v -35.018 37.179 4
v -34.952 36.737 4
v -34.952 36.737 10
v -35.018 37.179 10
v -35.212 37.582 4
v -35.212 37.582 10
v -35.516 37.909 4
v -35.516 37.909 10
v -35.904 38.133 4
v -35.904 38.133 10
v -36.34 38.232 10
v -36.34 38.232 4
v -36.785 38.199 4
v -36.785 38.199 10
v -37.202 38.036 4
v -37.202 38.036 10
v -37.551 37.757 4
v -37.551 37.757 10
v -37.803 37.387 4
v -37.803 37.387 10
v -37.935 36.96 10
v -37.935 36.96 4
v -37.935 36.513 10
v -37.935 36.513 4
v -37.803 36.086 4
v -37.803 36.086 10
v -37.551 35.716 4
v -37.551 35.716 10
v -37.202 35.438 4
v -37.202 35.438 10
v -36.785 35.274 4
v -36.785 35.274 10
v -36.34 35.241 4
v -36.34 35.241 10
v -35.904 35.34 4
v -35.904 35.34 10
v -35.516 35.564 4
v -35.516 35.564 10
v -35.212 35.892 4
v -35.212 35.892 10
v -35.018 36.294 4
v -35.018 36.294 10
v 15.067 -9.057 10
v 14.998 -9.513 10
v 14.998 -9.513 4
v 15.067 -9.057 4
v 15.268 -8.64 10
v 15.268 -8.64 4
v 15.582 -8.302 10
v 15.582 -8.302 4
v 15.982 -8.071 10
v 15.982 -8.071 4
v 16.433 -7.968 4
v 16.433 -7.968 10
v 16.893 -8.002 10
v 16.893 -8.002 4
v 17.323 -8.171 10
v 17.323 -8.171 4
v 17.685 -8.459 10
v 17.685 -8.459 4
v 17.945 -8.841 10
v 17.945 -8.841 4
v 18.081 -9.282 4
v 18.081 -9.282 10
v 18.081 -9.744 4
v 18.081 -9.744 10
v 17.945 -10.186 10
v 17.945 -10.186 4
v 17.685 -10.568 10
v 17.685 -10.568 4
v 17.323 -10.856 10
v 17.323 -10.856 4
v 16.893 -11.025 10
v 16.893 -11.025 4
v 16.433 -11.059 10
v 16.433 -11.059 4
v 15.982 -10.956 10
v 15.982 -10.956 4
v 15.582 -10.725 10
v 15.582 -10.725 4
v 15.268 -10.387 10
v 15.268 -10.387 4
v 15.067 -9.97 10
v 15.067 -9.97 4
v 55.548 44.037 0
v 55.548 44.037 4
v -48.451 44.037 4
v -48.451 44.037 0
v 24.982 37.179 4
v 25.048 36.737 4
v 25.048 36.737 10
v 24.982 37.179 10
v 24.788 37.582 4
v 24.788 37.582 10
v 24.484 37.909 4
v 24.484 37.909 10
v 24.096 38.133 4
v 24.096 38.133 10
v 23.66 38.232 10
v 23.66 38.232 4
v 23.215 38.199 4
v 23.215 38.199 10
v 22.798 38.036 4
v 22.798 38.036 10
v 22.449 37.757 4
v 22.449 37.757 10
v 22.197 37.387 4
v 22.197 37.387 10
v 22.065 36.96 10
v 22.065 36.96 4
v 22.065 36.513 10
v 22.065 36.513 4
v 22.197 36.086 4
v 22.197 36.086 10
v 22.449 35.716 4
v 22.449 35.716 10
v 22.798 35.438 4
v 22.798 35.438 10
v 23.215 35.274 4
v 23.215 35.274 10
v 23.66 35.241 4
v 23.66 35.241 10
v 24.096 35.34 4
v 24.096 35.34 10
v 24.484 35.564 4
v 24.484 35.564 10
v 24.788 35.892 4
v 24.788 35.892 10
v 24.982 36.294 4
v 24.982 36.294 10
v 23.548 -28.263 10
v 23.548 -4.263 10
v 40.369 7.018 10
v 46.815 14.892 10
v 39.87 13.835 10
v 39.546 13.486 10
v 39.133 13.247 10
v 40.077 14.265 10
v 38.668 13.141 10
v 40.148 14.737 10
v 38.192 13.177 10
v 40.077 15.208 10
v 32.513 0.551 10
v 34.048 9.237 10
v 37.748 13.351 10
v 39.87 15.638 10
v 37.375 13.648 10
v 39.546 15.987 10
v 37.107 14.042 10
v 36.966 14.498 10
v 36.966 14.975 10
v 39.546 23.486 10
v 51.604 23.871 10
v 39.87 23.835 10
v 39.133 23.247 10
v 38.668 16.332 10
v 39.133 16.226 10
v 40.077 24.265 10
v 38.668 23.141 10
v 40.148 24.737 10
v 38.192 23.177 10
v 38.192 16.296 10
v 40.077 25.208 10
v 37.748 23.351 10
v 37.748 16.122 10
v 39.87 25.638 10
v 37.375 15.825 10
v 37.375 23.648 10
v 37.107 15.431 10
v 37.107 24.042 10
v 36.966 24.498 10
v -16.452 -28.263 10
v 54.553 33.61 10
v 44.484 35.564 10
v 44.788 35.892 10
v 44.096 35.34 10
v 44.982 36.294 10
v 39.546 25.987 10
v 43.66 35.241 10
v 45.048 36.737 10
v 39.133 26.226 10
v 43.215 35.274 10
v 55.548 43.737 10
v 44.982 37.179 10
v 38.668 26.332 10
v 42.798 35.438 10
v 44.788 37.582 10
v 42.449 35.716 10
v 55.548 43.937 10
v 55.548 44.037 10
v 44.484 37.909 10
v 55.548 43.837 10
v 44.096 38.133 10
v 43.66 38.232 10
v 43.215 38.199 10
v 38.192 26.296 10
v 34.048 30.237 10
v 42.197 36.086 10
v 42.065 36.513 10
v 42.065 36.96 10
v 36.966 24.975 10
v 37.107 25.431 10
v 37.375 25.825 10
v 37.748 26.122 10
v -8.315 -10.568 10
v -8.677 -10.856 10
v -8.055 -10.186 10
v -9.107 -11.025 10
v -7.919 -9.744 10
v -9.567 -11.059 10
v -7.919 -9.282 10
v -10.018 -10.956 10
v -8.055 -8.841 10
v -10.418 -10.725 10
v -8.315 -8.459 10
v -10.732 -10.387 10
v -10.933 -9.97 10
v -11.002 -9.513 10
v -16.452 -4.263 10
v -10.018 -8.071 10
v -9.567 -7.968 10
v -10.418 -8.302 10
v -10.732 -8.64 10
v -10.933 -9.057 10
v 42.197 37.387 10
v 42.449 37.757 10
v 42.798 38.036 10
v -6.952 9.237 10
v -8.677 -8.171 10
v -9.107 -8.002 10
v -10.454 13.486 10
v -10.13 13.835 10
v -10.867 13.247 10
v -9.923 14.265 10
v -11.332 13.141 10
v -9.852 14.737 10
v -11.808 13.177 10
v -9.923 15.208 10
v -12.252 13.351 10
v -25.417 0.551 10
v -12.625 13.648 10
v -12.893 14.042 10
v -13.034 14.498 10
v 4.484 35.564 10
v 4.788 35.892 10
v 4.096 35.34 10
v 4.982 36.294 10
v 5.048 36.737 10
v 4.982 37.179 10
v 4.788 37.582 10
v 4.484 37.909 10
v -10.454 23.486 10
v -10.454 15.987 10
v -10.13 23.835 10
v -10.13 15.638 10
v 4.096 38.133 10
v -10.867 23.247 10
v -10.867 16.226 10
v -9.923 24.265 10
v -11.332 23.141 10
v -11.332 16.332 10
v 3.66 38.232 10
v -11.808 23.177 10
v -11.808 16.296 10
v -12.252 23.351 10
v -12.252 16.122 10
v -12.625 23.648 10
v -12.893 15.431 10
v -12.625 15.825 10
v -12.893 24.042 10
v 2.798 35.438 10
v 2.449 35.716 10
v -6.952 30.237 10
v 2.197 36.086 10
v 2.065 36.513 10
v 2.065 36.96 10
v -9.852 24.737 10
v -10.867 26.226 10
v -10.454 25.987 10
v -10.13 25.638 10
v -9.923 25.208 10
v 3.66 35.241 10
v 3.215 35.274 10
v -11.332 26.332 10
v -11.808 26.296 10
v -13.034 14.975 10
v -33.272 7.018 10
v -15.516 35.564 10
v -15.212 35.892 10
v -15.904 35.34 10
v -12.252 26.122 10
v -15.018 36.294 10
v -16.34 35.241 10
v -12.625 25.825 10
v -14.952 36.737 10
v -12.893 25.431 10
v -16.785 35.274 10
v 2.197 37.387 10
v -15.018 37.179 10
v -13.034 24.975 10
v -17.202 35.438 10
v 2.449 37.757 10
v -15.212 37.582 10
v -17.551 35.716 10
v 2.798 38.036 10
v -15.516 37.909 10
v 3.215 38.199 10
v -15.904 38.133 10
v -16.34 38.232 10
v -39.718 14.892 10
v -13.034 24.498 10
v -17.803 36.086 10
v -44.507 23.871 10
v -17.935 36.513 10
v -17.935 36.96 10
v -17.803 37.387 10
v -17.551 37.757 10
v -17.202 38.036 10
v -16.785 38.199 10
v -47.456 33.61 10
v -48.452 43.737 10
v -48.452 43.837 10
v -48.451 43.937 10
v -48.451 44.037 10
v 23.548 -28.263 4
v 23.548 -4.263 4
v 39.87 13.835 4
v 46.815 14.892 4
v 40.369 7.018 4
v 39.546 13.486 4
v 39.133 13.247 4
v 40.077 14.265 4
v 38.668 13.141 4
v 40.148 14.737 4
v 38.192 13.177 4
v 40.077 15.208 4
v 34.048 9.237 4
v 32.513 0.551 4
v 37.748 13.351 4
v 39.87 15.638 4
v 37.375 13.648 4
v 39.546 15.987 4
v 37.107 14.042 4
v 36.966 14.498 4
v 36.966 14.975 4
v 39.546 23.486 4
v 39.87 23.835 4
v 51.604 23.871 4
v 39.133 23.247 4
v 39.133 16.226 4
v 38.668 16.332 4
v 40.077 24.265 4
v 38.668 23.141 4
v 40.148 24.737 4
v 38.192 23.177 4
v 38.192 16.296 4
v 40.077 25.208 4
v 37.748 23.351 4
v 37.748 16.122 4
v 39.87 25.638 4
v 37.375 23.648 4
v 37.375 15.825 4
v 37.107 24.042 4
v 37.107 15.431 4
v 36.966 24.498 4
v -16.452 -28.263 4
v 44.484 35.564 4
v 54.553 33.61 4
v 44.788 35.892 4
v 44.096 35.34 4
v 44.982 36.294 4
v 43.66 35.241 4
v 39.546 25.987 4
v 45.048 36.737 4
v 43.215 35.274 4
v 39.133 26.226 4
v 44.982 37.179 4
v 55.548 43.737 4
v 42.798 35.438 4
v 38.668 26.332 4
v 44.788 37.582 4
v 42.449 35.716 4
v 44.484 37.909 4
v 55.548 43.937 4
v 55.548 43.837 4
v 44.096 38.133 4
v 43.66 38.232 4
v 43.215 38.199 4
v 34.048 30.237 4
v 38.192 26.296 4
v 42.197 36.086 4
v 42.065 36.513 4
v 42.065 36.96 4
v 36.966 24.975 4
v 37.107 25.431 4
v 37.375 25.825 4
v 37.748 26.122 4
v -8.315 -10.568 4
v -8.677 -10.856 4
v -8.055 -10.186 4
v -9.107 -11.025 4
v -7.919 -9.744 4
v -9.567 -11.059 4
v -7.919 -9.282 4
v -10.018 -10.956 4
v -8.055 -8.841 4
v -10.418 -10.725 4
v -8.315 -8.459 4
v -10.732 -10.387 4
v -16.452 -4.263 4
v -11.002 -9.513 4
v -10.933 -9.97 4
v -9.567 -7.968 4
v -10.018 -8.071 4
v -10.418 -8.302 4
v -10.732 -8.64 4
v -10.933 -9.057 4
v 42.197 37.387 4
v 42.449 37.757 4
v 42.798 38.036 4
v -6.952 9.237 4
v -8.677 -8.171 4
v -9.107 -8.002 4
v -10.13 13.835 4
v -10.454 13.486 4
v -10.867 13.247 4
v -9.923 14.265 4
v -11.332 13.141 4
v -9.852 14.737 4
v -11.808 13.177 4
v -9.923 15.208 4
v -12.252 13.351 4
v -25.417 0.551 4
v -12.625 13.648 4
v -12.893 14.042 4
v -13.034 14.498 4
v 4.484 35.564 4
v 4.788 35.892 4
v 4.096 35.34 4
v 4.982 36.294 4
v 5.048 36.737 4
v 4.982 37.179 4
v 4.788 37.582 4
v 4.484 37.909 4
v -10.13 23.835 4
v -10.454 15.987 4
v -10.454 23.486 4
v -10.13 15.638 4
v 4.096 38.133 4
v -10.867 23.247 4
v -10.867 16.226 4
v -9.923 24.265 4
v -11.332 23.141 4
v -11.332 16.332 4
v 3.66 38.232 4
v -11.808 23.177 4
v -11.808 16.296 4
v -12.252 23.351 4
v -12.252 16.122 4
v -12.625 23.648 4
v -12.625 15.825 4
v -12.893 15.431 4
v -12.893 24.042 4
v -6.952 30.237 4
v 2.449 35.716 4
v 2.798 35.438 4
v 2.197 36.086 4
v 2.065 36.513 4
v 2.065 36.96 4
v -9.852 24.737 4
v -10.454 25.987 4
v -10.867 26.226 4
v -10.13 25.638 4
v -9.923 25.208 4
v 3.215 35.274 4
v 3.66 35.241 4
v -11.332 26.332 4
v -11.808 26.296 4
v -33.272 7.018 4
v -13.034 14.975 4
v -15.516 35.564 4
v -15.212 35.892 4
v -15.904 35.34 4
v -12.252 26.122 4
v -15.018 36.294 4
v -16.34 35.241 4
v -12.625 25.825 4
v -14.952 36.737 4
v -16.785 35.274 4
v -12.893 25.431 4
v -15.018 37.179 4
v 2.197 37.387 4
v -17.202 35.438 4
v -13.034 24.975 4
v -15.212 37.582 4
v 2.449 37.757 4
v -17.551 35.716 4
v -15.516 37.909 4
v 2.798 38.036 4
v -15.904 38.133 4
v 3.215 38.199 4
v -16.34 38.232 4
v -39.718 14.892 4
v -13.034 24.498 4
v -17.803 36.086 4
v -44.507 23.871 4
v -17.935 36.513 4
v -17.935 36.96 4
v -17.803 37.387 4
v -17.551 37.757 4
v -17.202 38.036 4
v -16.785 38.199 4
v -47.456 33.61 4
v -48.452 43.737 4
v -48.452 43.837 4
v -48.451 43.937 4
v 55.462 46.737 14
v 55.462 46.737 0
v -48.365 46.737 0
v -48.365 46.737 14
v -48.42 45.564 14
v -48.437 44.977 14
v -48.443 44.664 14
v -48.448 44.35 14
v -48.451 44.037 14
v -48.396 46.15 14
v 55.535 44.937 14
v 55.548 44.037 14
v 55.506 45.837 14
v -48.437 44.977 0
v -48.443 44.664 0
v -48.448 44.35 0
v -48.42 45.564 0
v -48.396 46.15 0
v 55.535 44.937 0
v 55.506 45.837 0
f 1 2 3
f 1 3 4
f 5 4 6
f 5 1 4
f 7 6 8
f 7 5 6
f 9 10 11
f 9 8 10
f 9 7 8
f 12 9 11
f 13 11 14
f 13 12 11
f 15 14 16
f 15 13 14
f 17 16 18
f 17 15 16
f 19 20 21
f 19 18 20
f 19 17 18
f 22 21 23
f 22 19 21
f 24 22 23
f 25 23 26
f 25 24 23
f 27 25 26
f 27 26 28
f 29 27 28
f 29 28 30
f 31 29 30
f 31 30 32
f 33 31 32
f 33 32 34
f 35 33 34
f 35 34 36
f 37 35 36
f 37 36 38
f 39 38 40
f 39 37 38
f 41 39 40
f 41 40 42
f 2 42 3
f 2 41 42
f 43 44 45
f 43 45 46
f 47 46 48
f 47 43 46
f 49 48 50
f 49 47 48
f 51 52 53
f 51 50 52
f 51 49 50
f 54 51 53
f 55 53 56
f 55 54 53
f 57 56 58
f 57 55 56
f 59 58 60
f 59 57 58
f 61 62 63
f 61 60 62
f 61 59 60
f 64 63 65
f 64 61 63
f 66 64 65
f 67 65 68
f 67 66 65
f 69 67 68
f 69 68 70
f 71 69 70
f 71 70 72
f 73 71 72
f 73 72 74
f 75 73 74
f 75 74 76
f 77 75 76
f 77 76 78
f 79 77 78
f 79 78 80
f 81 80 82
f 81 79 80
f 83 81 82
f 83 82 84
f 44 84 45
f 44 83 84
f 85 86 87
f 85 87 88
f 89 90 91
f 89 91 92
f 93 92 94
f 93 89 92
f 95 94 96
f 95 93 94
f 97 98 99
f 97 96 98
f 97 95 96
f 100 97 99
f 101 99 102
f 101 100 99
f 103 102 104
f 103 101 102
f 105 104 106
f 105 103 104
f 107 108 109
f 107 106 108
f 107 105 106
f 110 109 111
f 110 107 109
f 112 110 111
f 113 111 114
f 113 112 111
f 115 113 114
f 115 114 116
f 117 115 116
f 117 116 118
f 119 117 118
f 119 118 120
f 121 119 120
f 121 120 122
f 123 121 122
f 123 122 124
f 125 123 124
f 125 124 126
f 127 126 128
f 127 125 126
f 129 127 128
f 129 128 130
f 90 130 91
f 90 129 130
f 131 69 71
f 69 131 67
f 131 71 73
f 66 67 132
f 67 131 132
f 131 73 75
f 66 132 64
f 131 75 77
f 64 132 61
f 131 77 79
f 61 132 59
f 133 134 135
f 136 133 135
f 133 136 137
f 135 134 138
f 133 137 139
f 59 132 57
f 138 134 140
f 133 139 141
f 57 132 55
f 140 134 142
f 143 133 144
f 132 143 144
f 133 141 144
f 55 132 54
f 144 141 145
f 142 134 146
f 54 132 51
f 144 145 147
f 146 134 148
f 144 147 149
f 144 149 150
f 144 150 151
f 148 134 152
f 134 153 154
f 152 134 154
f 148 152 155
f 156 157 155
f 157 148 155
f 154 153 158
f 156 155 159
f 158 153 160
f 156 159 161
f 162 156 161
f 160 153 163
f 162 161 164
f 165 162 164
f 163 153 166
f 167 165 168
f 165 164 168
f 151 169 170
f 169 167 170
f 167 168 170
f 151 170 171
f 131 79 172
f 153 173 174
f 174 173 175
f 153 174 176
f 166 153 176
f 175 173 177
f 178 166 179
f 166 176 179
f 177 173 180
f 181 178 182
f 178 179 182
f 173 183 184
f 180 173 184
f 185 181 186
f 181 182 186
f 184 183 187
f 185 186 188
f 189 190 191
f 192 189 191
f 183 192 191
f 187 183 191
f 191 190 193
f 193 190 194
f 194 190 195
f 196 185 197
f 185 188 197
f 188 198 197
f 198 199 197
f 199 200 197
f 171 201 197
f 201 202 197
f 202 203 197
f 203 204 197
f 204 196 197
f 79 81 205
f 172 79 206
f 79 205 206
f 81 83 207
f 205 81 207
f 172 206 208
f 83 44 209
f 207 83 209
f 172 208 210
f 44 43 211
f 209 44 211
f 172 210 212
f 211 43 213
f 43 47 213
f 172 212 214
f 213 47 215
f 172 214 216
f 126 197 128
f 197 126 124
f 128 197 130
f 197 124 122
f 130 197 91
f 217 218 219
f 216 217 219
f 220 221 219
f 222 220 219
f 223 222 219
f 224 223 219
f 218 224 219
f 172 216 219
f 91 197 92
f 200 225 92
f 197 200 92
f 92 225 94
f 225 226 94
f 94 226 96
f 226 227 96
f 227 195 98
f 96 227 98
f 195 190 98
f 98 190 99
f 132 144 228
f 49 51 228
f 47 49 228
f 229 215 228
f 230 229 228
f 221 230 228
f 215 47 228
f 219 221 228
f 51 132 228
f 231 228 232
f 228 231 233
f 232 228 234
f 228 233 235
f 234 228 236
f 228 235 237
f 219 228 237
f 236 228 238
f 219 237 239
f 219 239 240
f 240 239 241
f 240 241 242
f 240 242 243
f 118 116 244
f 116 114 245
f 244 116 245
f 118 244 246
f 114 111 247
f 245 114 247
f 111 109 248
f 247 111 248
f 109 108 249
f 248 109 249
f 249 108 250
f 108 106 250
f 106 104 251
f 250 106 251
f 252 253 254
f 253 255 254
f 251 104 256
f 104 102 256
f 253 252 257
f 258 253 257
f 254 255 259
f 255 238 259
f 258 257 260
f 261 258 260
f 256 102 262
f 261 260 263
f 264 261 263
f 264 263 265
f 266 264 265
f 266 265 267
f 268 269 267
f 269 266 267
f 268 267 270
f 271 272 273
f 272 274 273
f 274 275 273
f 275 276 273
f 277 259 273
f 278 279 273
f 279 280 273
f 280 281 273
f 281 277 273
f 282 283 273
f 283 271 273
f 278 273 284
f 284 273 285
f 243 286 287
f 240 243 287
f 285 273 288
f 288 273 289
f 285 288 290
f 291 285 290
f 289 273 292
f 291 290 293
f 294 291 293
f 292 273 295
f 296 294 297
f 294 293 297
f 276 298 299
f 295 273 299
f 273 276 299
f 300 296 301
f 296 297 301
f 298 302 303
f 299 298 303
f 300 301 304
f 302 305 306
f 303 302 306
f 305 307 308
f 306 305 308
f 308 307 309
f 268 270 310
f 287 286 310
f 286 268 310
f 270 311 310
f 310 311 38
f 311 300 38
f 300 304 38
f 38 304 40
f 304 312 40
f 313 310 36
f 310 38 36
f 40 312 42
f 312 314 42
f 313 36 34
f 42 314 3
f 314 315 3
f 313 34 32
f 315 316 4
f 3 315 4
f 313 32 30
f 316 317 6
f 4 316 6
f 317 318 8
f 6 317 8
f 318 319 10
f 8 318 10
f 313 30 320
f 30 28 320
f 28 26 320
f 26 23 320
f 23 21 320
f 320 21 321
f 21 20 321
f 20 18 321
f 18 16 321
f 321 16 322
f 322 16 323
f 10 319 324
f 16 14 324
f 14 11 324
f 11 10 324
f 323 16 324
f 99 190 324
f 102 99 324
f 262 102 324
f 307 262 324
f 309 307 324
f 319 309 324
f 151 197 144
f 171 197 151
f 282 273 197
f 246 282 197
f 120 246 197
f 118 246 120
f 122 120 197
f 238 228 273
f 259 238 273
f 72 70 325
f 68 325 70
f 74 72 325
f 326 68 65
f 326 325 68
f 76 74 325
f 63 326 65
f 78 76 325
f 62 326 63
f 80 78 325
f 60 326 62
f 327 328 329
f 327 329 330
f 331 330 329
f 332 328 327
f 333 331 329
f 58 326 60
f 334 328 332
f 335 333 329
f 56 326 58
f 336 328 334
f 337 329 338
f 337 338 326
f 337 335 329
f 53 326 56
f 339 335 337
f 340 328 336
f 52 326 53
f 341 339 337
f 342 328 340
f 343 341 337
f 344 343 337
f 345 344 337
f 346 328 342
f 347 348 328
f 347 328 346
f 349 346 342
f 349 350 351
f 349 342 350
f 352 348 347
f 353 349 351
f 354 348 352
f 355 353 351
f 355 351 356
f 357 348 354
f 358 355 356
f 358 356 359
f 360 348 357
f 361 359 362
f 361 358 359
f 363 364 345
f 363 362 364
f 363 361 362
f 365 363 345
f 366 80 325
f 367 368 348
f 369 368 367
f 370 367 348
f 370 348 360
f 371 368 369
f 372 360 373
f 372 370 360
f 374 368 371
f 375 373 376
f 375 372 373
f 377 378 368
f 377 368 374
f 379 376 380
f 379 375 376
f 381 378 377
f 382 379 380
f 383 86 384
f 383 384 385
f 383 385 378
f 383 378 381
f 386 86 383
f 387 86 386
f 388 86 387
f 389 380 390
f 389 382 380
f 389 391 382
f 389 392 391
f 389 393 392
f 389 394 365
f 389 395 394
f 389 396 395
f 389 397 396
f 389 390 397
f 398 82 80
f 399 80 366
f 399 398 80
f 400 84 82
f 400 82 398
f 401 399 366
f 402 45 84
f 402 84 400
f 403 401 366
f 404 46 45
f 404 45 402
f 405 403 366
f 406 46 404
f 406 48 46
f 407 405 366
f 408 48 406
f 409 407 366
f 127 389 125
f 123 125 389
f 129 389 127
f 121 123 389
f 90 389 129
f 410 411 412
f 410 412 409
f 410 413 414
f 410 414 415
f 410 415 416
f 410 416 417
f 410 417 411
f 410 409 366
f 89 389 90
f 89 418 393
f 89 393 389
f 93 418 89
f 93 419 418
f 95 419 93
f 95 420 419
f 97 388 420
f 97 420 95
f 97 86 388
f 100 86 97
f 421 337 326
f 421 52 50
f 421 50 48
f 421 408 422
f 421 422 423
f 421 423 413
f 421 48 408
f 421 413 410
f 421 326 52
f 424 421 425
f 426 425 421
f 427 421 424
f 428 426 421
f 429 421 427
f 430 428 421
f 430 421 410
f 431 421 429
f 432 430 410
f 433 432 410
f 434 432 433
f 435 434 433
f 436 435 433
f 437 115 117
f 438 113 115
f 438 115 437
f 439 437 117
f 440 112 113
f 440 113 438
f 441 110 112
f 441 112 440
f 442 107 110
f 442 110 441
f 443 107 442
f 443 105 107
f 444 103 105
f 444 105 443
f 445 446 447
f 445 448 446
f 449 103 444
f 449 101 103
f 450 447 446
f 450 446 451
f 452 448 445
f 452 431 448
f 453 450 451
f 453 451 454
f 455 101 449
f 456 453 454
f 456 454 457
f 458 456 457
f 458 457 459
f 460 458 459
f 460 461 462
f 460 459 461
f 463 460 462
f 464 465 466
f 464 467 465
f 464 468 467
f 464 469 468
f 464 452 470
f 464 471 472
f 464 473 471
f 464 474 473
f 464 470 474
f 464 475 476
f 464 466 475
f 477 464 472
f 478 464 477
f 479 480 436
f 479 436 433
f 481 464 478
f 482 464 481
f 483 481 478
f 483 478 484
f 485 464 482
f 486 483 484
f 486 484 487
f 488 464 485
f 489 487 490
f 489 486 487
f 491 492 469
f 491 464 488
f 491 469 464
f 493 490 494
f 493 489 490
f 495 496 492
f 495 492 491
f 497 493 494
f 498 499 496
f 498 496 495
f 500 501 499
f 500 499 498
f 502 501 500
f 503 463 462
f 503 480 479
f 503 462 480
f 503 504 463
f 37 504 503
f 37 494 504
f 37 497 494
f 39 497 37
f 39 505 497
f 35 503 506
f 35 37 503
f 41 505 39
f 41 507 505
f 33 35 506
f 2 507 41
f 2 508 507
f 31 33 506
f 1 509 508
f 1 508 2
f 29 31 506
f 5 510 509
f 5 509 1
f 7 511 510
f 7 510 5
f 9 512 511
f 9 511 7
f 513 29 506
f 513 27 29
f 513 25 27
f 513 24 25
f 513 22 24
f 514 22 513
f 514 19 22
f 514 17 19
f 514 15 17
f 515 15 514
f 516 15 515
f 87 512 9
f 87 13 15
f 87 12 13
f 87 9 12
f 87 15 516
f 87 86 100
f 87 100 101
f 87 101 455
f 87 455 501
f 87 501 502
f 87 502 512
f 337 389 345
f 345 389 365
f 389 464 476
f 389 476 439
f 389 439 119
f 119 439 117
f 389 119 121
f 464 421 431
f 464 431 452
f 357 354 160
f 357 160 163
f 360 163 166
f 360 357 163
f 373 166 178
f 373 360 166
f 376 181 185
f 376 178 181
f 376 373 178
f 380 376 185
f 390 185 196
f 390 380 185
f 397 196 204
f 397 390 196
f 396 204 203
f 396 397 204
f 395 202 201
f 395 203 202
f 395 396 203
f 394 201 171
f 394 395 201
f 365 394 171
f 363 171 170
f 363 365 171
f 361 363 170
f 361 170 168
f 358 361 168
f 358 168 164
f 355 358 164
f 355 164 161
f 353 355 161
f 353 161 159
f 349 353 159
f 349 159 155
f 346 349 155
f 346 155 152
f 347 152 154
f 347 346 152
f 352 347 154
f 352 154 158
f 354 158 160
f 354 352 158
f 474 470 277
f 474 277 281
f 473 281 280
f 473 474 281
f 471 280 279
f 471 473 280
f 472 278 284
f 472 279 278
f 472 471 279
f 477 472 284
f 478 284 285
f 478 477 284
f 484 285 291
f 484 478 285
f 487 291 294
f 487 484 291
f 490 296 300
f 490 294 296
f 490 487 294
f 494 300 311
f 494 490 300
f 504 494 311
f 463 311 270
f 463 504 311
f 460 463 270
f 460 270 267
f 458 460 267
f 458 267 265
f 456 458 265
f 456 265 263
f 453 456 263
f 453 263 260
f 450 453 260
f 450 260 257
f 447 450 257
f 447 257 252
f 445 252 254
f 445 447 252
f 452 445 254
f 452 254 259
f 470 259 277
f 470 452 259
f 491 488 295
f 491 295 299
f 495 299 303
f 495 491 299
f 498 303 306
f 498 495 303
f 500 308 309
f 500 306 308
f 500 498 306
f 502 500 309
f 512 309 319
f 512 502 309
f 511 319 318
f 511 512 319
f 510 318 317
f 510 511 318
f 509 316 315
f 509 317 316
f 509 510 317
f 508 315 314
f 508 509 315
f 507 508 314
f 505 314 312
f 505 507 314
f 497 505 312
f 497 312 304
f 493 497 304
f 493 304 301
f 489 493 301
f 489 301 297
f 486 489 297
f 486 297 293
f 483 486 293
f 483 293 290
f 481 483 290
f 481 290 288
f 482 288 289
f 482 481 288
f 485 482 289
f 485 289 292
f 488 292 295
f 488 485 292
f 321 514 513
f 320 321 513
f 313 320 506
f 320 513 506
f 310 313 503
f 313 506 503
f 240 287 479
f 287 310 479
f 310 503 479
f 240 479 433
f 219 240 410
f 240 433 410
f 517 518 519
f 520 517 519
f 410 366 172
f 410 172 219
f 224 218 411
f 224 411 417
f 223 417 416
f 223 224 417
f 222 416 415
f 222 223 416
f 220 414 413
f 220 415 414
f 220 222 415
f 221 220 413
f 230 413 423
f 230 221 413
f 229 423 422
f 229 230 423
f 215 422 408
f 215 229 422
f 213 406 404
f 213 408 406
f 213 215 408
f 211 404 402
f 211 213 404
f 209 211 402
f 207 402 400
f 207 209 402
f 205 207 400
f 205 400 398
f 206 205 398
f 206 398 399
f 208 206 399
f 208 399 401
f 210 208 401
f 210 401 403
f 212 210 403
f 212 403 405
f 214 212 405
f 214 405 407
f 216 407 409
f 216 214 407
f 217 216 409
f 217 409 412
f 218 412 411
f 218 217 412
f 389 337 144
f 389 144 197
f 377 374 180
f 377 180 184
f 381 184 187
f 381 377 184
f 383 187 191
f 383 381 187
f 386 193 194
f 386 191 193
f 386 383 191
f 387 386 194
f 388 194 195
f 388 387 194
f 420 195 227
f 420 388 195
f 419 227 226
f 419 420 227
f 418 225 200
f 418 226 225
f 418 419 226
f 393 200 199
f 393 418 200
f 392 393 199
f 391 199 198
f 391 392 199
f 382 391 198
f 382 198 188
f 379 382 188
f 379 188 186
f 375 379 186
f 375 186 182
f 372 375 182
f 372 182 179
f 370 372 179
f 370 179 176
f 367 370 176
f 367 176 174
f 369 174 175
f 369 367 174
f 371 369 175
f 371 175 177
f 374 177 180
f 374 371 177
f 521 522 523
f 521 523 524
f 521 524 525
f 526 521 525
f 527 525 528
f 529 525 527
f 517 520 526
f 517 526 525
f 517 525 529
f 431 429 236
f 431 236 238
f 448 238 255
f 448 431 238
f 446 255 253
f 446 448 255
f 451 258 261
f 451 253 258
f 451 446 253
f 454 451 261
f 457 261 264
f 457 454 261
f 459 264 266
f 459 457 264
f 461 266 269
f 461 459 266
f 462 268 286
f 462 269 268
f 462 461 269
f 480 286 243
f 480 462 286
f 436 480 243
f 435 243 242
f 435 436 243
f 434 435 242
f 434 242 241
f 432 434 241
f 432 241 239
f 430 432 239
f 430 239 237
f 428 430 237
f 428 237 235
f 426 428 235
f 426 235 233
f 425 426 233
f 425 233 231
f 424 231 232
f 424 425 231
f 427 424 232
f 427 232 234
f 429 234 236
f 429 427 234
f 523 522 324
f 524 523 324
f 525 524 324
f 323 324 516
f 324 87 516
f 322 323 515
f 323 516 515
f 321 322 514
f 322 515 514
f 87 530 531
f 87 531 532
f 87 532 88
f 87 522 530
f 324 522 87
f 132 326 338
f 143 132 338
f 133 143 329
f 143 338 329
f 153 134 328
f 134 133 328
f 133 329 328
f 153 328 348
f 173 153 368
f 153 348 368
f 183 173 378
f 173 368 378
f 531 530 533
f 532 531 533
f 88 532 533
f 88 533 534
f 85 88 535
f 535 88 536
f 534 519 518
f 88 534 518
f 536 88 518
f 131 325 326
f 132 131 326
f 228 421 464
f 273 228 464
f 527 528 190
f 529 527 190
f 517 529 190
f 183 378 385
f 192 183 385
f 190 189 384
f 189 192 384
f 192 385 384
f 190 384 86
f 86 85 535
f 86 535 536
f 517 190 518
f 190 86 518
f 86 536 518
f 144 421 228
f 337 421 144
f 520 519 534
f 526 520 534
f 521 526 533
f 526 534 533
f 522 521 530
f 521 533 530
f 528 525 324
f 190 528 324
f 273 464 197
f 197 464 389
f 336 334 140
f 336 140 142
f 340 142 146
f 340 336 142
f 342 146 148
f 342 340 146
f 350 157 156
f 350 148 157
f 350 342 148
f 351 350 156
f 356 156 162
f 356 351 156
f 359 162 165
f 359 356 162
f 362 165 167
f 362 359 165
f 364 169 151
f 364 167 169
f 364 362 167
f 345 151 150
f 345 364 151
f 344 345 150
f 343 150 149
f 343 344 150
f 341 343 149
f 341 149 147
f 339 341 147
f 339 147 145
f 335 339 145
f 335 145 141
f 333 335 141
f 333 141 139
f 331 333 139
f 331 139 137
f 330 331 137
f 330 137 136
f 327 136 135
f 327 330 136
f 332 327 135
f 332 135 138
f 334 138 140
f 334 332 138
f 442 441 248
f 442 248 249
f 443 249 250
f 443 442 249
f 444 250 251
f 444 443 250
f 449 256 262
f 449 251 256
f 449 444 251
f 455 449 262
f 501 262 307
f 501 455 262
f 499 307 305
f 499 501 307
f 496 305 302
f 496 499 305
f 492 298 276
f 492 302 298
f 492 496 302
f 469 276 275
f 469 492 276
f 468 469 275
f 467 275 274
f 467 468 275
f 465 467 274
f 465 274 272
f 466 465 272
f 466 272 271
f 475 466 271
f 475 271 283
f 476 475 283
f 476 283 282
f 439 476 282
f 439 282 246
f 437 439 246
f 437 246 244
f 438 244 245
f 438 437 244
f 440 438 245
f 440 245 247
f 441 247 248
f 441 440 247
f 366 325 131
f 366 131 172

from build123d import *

# Parameters (mm, degrees)
SKETCH_1_R               = 1.6
SKETCH_1_R_2             = 1.5
SKETCH_1_W               = 41
SKETCH_1_H               = 21
EXTRUDE_1_DEPTH          = 14
CUT_EXTRUDE_1_DEPTH      = 87.973011371
CUT_EXTRUDE_1_DEPTH_BACK = 87.973011371
SKETCH_2_W               = 4
SKETCH_2_H               = 20
SKETCH_2_H_2             = 48.3
SKETCH_3_W               = 40
SKETCH_3_H               = 4
EXTRUDE_2_DEPTH          = 6
CUT_EXTRUDE_2_DEPTH      = 74.279789476
CUT_EXTRUDE_2_DEPTH_BACK = 74.279789476
SKETCH_4_R               = 1.55


with BuildPart() as part:
    # 草图1 → 凸台-拉伸1 (new body)
    with BuildSketch(Plane.XY):
        with BuildLine():
            Line((55.461772272, 46.736545732), (-48.365006547, 46.736545732))
            ThreePointArc((-48.365006547, 46.736545732), (-48.408359148, 45.857149327), (-48.436816123, 44.977144959))
            ThreePointArc((-48.436816123, 44.977144959), (-48.447916752, 44.35688949), (-48.451617137, 43.736545732))
            ThreePointArc((-48.451617137, 43.736545732), (-39.718232443, 14.892135528), (-16.451617137, -4.263454268))
            Line((-16.451617137, -4.263454268), (-16.451617137, -8.263454268))
            Line((-16.451617137, -8.263454268), (-16.451617137, -24.263454268))
            Line((-16.451617137, -24.263454268), (23.548382863, -24.263454268))
            Line((23.548382863, -24.263454268), (23.548382863, -8.263454268))
            Line((23.548382863, -8.263454268), (23.548382863, -4.263454268))
            ThreePointArc((23.548382863, -4.263454268), (46.814998168, 14.892135528), (55.548382863, 43.736545732))
            ThreePointArc((55.548382863, 43.736545732), (55.526725705, 45.237170718), (55.461772272, 46.736545732))
        make_face()
        with Locations((-11.451617137, 14.736545732)):
            Circle(SKETCH_1_R, mode=Mode.SUBTRACT)
        with Locations((-11.451617137, 24.736545732)):
            Circle(SKETCH_1_R, mode=Mode.SUBTRACT)
        with Locations((-36.451617137, 36.736545732)):
            Circle(SKETCH_1_R_2, mode=Mode.SUBTRACT)
        with Locations((-16.451617137, 36.736545732)):
            Circle(SKETCH_1_R_2, mode=Mode.SUBTRACT)
        with Locations((13.548382863, 19.736545732)):
            Rectangle(SKETCH_1_W, SKETCH_1_H, mode=Mode.SUBTRACT)
        with Locations((38.548382863, 14.736545732)):
            Circle(SKETCH_1_R, mode=Mode.SUBTRACT)
        with Locations((38.548382863, 24.736545732)):
            Circle(SKETCH_1_R, mode=Mode.SUBTRACT)
        with Locations((3.548382863, 36.736545732)):
            Circle(SKETCH_1_R_2, mode=Mode.SUBTRACT)
        with Locations((23.548382863, 36.736545732)):
            Circle(SKETCH_1_R_2, mode=Mode.SUBTRACT)
        with Locations((43.548382863, 36.736545732)):
            Circle(SKETCH_1_R_2, mode=Mode.SUBTRACT)
    extrude(amount=EXTRUDE_1_DEPTH)

    # 草图2 → 切除-拉伸1 (cut, two sides: drawn at the far end of the back side and taken through both)
    with BuildSketch(Plane(origin=(23.548382863, 0, 0), x_dir=(0, 0, -1), z_dir=(1, 0, 0)).offset(-CUT_EXTRUDE_1_DEPTH_BACK)):
        with Locations((-12, -14.263454268)):
            Rectangle(SKETCH_2_W, SKETCH_2_H)
        with Locations((-12, 19.886545732)):
            Rectangle(SKETCH_2_W, SKETCH_2_H_2)
        with Locations((-2, 19.886545732)):
            Rectangle(SKETCH_2_W, SKETCH_2_H_2)
        with Locations((-2, -14.263454268)):
            Rectangle(SKETCH_2_W, SKETCH_2_H)
    extrude(amount=CUT_EXTRUDE_1_DEPTH + CUT_EXTRUDE_1_DEPTH_BACK, mode=Mode.SUBTRACT)

    # 草图3 → 凸台-拉伸2 (add)
    with BuildSketch(Plane(origin=(0, 0, 4), x_dir=(-1, 0, 0), z_dir=(0, 0, -1))):
        with Locations((-3.548382863, -26.263454268)):
            Rectangle(SKETCH_3_W, SKETCH_3_H)
    extrude(amount=-EXTRUDE_2_DEPTH)

    # 草图4 → 切除-拉伸2 (cut, two sides: drawn at the far end of the back side and taken through both)
    with BuildSketch(Plane(origin=(0, 0, 4), x_dir=(-1, 0, 0), z_dir=(0, 0, -1)).offset(-CUT_EXTRUDE_2_DEPTH_BACK)):
        with Locations((-16.548382863, -9.513454268)):
            Circle(SKETCH_4_R)
        with Locations((9.451617137, -9.513454268)):
            Circle(SKETCH_4_R)
    extrude(amount=CUT_EXTRUDE_2_DEPTH + CUT_EXTRUDE_2_DEPTH_BACK, mode=Mode.SUBTRACT)


solid = part.part
